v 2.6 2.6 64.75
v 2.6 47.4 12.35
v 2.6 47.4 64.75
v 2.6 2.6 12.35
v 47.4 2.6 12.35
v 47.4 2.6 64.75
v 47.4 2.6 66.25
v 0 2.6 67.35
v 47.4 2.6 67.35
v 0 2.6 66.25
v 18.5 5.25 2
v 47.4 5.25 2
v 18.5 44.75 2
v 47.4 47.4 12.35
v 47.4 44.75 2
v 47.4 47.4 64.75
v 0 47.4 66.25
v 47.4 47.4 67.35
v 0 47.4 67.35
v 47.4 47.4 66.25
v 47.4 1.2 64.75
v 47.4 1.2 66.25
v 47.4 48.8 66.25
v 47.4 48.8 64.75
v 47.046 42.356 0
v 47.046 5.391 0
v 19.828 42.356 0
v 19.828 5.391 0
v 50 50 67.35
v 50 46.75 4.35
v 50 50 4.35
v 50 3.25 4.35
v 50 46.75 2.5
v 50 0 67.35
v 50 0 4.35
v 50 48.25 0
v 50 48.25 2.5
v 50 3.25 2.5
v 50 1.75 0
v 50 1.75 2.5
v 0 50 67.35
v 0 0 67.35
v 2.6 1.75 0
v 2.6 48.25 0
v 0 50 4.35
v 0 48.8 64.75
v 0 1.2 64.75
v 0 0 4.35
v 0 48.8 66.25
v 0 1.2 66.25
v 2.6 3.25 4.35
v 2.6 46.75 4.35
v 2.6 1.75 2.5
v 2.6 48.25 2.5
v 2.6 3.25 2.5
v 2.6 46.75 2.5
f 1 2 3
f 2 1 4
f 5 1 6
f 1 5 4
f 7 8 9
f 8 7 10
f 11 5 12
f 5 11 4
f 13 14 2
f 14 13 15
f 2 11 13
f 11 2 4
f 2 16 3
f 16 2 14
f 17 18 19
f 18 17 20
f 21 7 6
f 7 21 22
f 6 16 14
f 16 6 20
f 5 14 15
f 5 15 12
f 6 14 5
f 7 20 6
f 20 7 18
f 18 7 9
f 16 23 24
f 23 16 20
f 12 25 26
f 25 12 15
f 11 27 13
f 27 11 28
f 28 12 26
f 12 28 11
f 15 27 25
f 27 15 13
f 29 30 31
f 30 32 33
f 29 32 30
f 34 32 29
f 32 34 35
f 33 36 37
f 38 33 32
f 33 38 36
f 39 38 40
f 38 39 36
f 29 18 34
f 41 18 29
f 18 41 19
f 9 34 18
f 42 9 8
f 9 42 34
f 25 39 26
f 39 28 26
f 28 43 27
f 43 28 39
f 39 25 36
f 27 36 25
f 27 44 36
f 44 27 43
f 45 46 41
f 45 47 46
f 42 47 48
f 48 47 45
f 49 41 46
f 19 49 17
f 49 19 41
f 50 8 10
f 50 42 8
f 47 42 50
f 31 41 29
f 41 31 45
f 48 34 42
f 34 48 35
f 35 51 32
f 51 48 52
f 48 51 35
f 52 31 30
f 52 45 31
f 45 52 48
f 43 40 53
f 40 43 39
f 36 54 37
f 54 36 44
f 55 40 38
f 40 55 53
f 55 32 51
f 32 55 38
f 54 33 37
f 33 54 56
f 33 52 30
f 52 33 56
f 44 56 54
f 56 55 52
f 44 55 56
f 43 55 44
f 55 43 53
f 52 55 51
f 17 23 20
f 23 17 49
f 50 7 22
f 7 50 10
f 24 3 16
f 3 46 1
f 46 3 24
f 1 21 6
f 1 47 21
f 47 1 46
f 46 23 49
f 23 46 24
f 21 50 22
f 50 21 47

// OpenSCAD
$fn = 60;

panjang_x = 50.0; lebar_y = 50.0; tinggi_total_10cm = 100.0;
tinggi_bawah_z = 34.0; tebal_tutup = 3.0; toleransi = 0.25;
lebar_lidah = 1.5; tinggi_lidah = 2.5; tebal_bibir = 1.5; tinggi_bibir_atas = 1.6;
tinggi_alur_total = tinggi_lidah + toleransi + tinggi_bibir_atas;
tinggi_atas_z = (tinggi_total_10cm - tinggi_bawah_z - tebal_tutup) + tinggi_alur_total;
lubang_keluar = 8.0; tebal_dinding = 2.6; tinggi_kolong_bawah = 6.8;
posisi_lubang_x = 39.0; posisi_lubang_y = 11.0; batas_kiri_corong_x = 18.5;
z_mulai_corong_global = 42.0; lantai_alur_z = tinggi_bawah_z - tinggi_alur_total;

lebar_rel = tebal_bibir + lebar_lidah + toleransi; // 3.25 mm
tebal_dinding_samping_corong = 2.0;
corong_y_min = lebar_rel + tebal_dinding_samping_corong; // 5.25 mm
corong_lebar_y = lebar_y - (2 * corong_y_min); // 39.5 mm

module profil_corong_global() {
    rongga_penuh_x = panjang_x - (2 * tebal_dinding);
    rongga_penuh_y = lebar_y - (2 * tebal_dinding);
    lebar_corong_tengah_x = (panjang_x - tebal_dinding) - batas_kiri_corong_x;

    hull() {
        translate([tebal_dinding, tebal_dinding, z_mulai_corong_global])
            cube([rongga_penuh_x, rongga_penuh_y, 0.1]);
        translate([batas_kiri_corong_x, corong_y_min, lantai_alur_z + 2.0])
            cube([lebar_corong_tengah_x, corong_lebar_y, 0.1]);
    }
    hull() {
        translate([batas_kiri_corong_x, corong_y_min, lantai_alur_z + 2.0])
            cube([lebar_corong_tengah_x, corong_lebar_y, 0.1]);
        translate([posisi_lubang_x - (lubang_keluar / 2), posisi_lubang_y - (lubang_keluar / 2), tinggi_kolong_bawah])
            cube([lubang_keluar, lubang_keluar, 0.1]);
    }
    translate([posisi_lubang_x - (lubang_keluar / 2), posisi_lubang_y - (lubang_keluar / 2), tinggi_kolong_bawah - 1])
        cube([lubang_keluar, lubang_keluar, 2.0]);
}

lebar_alur_tutup = lebar_y - (2 * tebal_dinding);
lebar_lidah_tutup = lebar_alur_tutup + (2 * 1.4);
z_mulai_lokal = z_mulai_corong_global - lantai_alur_z;

module kotak_atas() {
    difference() {
        cube([panjang_x, lebar_y, tinggi_atas_z]);

        // 1. Celah luar presisi untuk dinding luar laci servo
        translate([-1, -1, -0.1])
            cube([panjang_x + 2, tebal_bibir + toleransi + 1, tinggi_alur_total + 0.1]);
        translate([-1, lebar_y - (tebal_bibir + toleransi), -0.1])
            cube([panjang_x + 2, tebal_bibir + toleransi + 1, tinggi_alur_total + 0.1]);

        // 2. Celah di atas lidah presisi untuk bibir penahan laci servo
        translate([-1, -1, tinggi_lidah])
            cube([panjang_x + 2, lebar_rel + 1, tinggi_alur_total - tinggi_lidah]);
        translate([-1, lebar_y - lebar_rel, tinggi_lidah])
            cube([panjang_x + 2, lebar_rel + 1, tinggi_alur_total - tinggi_lidah]);

        // 3. Potongan stopper dibalik ke depan (X = 0 s/d tebal_dinding) agar pas dengan dinding stopper laci
        translate([-0.1, -1, -0.1])
            cube([tebal_dinding + 0.1, lebar_y + 2, tinggi_alur_total + 0.1]);

        // Ujung lidah di X = 50 dibuat rata rapi 90 derajat siku seperti rel tutup slide (Y: 0 dekat X: 0)

        // Rongga dalam kotak penampung atas
        translate([tebal_dinding, tebal_dinding, z_mulai_lokal])
            cube([panjang_x - (2 * tebal_dinding), lebar_y - (2 * tebal_dinding), tinggi_atas_z]);
        translate([0, 0, -lantai_alur_z]) profil_corong_global();

        // Rel geser untuk tutup atas
        translate([-1, (lebar_y - lebar_lidah_tutup) / 2, tinggi_atas_z - 2.6])
            cube([panjang_x - tebal_dinding + 1, lebar_lidah_tutup, 1.5]);
        translate([-1, tebal_dinding, tinggi_atas_z - 2.6])
            cube([panjang_x - tebal_dinding + 1, lebar_alur_tutup, 3.0]);
    }
}
kotak_atas();
